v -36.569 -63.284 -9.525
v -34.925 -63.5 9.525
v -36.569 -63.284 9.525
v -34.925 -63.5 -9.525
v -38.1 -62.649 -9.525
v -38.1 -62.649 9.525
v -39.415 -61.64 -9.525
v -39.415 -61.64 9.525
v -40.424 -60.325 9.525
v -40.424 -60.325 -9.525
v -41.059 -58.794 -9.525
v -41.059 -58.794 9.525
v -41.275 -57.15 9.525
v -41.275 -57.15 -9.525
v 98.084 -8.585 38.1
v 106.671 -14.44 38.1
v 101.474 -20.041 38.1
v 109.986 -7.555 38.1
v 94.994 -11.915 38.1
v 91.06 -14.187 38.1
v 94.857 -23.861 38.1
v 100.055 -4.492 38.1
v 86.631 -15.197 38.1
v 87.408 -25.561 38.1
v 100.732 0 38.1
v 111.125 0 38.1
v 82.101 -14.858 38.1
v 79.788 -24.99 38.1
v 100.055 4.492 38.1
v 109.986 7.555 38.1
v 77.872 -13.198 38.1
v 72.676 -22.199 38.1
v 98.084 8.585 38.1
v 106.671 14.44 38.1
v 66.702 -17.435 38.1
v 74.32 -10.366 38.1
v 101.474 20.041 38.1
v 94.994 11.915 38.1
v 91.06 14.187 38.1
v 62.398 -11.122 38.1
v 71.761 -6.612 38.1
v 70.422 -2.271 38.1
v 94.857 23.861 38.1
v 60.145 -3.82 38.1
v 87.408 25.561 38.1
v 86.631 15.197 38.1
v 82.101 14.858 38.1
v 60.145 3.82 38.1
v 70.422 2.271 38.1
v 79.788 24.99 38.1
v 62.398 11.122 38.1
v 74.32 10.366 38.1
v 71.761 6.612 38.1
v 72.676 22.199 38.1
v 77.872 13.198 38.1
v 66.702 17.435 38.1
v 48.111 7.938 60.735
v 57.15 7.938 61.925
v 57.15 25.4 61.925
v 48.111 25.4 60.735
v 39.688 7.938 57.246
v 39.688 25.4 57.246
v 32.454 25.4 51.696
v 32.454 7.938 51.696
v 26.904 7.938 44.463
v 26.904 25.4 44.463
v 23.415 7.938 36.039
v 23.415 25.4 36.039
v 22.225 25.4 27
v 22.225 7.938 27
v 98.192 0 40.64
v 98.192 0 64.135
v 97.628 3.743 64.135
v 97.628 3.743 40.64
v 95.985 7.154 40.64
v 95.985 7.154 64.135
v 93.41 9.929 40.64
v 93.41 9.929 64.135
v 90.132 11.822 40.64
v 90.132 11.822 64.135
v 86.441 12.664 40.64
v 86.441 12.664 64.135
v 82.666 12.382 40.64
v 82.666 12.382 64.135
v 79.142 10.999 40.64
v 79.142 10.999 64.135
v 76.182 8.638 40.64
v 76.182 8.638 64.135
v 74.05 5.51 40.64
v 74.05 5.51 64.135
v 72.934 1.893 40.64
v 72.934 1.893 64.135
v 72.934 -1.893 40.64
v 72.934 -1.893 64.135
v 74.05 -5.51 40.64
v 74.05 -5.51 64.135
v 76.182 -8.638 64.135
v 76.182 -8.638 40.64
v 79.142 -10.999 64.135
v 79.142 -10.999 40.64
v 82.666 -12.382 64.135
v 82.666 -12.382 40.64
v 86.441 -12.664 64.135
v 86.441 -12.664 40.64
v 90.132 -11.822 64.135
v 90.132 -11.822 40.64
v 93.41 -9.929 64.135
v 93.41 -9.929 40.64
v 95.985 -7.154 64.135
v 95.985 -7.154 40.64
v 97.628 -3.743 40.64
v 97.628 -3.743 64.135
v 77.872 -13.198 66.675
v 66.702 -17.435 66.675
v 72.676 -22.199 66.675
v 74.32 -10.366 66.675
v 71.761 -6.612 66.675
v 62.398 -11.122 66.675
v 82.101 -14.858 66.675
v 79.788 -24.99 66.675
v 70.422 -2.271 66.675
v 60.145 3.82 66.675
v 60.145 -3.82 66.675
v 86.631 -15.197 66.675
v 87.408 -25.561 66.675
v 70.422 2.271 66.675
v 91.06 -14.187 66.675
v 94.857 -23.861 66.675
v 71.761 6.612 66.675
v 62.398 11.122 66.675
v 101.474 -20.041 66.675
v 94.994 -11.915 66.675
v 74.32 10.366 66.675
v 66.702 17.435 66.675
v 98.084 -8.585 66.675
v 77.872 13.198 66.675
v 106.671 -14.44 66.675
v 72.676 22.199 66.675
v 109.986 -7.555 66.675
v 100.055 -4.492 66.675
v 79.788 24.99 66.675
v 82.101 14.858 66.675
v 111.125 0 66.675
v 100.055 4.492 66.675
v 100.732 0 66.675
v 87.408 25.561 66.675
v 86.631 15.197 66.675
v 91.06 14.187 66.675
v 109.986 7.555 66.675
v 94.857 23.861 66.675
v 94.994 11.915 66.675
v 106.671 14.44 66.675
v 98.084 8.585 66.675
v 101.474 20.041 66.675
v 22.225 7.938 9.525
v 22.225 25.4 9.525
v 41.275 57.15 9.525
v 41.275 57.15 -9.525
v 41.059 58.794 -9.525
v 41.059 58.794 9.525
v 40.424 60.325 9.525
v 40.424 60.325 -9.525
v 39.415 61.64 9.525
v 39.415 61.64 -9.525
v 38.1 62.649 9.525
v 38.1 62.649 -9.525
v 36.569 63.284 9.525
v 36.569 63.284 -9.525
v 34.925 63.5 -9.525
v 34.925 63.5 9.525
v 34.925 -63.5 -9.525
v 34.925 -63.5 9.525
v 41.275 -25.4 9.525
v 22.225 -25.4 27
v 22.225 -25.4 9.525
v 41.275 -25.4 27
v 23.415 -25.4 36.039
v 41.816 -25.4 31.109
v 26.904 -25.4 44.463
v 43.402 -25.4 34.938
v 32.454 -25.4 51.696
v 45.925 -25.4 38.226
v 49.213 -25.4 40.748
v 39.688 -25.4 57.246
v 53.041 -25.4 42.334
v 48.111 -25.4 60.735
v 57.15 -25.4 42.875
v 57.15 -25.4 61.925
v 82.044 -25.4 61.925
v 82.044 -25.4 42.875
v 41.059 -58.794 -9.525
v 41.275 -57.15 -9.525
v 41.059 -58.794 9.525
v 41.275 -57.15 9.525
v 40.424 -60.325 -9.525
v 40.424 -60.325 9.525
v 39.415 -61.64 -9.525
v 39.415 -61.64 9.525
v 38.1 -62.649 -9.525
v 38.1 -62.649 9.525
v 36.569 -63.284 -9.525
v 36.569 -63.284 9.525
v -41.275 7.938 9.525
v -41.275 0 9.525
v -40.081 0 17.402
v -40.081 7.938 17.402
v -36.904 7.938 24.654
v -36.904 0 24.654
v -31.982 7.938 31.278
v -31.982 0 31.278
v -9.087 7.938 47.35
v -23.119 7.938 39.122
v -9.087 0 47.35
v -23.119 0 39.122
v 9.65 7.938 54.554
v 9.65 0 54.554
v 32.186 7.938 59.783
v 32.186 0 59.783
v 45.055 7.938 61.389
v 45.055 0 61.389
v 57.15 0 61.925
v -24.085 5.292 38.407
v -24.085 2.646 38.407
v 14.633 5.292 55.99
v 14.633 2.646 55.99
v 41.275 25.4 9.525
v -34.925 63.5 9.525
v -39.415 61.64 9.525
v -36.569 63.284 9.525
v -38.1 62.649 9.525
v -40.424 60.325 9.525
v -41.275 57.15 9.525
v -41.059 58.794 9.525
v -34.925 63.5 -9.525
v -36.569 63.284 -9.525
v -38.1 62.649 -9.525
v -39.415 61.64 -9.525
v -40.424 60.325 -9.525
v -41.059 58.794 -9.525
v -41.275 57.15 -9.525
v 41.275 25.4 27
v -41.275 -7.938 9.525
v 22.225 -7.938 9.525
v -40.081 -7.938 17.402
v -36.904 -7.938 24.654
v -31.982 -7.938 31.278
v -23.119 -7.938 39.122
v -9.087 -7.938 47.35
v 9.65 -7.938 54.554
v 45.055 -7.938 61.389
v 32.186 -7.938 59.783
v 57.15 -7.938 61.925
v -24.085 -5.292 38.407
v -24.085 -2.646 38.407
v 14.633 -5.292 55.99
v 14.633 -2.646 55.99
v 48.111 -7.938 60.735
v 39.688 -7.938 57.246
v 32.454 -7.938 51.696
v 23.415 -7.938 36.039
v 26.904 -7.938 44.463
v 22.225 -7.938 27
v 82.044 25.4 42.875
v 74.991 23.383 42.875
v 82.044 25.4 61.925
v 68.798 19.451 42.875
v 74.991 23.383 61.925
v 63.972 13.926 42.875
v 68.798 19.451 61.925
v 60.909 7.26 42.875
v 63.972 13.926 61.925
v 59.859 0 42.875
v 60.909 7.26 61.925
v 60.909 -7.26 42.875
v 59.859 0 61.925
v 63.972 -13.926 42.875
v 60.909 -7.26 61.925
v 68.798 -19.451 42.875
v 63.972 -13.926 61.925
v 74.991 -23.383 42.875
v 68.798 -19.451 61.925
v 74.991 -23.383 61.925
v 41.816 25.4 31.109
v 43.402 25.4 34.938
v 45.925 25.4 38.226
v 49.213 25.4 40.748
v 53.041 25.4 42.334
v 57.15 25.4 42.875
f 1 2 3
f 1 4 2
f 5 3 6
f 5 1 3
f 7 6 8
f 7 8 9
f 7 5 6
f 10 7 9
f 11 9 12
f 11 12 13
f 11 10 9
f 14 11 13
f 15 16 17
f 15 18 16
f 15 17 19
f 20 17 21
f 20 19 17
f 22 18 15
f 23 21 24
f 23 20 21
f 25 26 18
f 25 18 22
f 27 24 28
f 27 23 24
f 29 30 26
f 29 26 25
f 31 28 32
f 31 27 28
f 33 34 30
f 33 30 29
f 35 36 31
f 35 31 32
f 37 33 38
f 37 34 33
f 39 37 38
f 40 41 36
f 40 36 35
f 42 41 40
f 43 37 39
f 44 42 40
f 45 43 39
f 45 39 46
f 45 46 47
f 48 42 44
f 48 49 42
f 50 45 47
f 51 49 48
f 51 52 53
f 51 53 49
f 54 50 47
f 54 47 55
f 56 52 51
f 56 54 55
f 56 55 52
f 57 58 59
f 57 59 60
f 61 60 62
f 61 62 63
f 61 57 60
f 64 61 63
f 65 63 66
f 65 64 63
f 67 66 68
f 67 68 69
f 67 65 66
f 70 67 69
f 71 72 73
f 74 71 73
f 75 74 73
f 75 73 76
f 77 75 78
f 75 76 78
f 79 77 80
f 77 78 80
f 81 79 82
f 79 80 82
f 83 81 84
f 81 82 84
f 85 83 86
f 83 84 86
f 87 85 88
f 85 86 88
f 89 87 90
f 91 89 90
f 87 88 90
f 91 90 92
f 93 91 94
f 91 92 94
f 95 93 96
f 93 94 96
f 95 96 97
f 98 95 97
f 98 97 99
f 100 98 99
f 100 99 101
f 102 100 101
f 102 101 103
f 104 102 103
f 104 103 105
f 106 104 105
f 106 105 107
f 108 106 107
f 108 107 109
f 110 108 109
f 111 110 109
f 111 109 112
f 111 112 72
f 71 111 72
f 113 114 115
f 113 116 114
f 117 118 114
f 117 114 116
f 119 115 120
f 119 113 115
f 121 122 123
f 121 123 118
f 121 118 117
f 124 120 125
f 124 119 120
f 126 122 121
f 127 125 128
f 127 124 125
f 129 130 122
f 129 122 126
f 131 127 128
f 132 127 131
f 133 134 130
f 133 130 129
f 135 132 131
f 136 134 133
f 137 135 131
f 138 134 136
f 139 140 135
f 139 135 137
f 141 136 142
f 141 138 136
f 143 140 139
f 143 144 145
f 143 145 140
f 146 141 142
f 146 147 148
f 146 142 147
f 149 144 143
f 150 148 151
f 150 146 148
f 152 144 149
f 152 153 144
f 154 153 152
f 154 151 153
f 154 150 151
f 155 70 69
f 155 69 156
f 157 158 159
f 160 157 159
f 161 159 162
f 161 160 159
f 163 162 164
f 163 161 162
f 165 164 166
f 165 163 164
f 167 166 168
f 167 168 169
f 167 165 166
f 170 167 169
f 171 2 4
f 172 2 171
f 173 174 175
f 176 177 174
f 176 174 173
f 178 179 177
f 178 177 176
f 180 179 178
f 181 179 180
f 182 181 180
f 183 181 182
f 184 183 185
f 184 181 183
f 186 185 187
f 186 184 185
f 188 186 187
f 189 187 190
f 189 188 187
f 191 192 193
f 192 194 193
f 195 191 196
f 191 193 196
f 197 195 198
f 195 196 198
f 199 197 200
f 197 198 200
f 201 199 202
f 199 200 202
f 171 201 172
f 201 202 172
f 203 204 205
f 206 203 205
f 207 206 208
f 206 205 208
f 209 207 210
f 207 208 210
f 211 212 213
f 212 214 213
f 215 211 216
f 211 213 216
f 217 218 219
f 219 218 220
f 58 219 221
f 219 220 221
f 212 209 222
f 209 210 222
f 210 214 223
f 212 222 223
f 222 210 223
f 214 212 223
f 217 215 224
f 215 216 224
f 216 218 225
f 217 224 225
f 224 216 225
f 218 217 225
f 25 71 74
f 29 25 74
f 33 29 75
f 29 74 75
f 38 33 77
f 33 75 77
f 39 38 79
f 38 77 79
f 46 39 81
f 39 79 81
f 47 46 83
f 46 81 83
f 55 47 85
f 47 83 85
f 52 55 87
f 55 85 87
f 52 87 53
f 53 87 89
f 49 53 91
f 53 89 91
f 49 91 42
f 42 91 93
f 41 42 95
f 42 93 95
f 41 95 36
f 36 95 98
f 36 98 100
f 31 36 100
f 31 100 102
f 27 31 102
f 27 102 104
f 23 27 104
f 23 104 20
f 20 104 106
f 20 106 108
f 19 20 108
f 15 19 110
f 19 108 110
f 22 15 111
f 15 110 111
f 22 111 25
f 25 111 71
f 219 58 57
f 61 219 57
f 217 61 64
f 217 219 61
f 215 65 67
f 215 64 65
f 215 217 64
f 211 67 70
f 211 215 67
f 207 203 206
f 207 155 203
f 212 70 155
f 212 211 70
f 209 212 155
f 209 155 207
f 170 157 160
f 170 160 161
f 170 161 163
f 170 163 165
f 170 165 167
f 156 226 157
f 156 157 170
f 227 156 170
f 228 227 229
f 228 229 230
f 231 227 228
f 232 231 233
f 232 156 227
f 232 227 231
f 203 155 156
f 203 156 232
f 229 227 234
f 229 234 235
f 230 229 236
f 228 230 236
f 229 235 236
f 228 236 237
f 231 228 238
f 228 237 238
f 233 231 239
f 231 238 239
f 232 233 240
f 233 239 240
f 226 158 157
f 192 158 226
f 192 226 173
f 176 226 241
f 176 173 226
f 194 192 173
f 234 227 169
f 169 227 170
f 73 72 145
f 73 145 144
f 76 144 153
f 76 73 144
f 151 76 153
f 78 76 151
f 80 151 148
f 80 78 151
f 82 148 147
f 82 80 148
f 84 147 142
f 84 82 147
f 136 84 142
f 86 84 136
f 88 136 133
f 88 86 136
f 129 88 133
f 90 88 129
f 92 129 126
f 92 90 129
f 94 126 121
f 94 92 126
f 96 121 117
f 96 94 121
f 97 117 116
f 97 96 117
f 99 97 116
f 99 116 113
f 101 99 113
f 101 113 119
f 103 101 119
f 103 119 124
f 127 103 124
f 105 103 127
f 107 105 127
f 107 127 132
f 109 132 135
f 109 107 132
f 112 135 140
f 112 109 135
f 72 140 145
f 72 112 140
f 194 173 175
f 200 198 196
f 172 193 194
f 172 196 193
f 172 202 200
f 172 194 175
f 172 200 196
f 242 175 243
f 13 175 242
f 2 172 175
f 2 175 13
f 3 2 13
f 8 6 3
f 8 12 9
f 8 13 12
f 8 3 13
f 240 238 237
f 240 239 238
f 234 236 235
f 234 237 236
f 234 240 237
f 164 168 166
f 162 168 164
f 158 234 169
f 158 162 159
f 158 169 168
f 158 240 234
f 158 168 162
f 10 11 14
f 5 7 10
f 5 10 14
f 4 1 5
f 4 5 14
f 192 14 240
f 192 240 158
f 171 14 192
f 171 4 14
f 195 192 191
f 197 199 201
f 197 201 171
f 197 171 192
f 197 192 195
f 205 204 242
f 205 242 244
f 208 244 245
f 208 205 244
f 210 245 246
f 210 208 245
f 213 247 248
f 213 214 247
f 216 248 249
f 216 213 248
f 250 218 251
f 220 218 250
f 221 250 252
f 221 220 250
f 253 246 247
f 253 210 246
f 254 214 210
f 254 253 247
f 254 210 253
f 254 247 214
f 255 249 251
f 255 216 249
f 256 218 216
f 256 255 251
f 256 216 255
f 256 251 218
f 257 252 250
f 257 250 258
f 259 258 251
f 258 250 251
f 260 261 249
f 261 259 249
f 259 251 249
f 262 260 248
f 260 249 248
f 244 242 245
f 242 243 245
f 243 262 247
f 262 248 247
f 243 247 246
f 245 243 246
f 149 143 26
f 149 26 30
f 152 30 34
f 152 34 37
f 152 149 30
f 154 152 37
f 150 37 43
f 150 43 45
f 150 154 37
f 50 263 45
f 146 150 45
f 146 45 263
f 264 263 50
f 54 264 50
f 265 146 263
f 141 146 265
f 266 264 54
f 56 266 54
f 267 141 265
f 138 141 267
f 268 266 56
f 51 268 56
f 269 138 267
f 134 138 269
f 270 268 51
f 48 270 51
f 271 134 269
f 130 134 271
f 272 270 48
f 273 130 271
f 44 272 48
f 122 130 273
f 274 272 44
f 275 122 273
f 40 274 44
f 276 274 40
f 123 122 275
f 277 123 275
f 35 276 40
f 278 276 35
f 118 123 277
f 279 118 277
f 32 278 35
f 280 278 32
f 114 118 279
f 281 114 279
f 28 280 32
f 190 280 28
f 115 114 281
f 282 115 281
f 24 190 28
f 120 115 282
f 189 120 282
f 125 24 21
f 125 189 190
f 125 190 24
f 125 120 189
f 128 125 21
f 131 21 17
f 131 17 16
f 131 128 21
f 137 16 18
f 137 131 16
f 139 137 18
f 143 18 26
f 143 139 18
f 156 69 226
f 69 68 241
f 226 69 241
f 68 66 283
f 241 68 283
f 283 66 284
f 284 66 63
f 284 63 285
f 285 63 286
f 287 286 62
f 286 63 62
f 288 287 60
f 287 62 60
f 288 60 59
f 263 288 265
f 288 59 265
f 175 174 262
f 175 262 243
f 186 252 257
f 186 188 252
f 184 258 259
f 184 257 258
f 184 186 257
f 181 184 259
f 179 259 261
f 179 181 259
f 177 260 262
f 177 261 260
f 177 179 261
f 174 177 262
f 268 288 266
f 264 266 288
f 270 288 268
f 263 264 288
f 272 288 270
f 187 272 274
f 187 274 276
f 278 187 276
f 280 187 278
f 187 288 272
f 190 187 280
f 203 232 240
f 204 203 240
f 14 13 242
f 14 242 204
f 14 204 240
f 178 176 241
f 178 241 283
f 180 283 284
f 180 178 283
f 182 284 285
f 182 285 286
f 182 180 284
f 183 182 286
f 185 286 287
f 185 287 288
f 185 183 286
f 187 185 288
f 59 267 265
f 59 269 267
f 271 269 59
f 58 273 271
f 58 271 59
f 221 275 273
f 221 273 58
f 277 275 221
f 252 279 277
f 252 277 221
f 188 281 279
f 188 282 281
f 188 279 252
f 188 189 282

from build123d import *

# Parameters (mm, degrees)
F1_DEPTH = 63.5
F2_DEPTH = 25.4
F3_DEPTH = 7.9375
F5_R     = 6.35
F6_R     = 12.7
F7_DEPTH = 76.201
F8_SIZE  = 2.54


with BuildPart() as f1:
    # F0 (on Front) → F1 (new body, symmetric)
    with BuildSketch(Plane.XZ):
        Polygon((-41.275, 9.525), (-41.275, -9.525), (41.275, -9.525), (41.275, 9.525), (22.225, 9.525), align=None)
    extrude(amount=F1_DEPTH, both=True)

    # F0 (on Front) → F2 (join, symmetric)
    with BuildSketch(Plane.XZ):
        with BuildLine():
            Line((22.225, 9.525), (41.275, 9.525))
            Line((41.275, 9.525), (41.275, 27.0002))
            ThreePointArc((41.275, 27.0002), (45.9246798487, 38.2255201513), (57.15, 42.8752))
            Line((57.15, 42.8752), (60.325, 42.8752))
            Line((60.325, 42.8752), (85.4920223873, 42.8752))
            Line((85.4920223873, 42.8752), (85.4920223873, 61.9252))
            Line((85.4920223873, 61.9252), (60.325, 61.9252))
            Line((60.325, 61.9252), (57.15, 61.9252))
            ThreePointArc((57.15, 61.9252), (32.4542956671, 51.6959043329), (22.225, 27.0002))
            Line((22.225, 27.0002), (22.225, 9.525))
        make_face()
    extrude(amount=F2_DEPTH, both=True)

    # F0 (on Front) → F3 (join, symmetric)
    with BuildSketch(Plane.XZ):
        with BuildLine():
            add(Edge.make_bspline(
                [(-41.275, 9.525), (-40.758330375, 43.9411401749), (18.6435300857, 61.9299374521), (57.15, 61.9252)],
                knots=[0, 0, 0, 0, 111.5045361635, 111.5045361635, 111.5045361635, 111.5045361635], degree=3))
            Line((-41.275, 9.525), (22.225, 9.525))
            Line((22.225, 9.525), (22.225, 27.0002))
            ThreePointArc((22.225, 27.0002), (32.4542956671, 51.6959043329), (57.15, 61.9252))
        make_face()
    extrude(amount=F3_DEPTH, both=True)

    # F0 (on Front) → F4 (revolve)
    with BuildSketch(Plane.XZ):
        Polygon((85.4920223873, 66.675), (85.4920223873, 61.9252), (85.4920223873, 42.8752), (85.4920223873, 38.1), (111.125, 38.1), (111.125, 66.675), align=None)
    revolve(axis=Axis((85.4920223873, 0, 52.4002), (0, 0, 1)))

    # F5
    f5_edges = [f1.edges().sort_by_distance(p)[0] for p in [
        (-41.275, -63.5, 0),
        (41.275, -63.5, 0),
        (41.275, 63.5, 0),
        (-41.275, 63.5, 0),
    ]]
    fillet(f5_edges, radius=F5_R)

    # F6 (on face) → F7 (cut, through all)
    with BuildSketch(Plane.XY.offset(66.675)):
        with Locations((85.4920223873, 0)):
            Circle(F6_R)
    extrude(amount=-F7_DEPTH, mode=Mode.SUBTRACT)

    # F8
    f8_edges = [f1.edges().sort_by_distance(p)[0] for p in [
        (72.792022, 0, 66.675),
        (72.792022, 0, 38.1),
    ]]
    chamfer(f8_edges, length=F8_SIZE)


solid = f1.part
